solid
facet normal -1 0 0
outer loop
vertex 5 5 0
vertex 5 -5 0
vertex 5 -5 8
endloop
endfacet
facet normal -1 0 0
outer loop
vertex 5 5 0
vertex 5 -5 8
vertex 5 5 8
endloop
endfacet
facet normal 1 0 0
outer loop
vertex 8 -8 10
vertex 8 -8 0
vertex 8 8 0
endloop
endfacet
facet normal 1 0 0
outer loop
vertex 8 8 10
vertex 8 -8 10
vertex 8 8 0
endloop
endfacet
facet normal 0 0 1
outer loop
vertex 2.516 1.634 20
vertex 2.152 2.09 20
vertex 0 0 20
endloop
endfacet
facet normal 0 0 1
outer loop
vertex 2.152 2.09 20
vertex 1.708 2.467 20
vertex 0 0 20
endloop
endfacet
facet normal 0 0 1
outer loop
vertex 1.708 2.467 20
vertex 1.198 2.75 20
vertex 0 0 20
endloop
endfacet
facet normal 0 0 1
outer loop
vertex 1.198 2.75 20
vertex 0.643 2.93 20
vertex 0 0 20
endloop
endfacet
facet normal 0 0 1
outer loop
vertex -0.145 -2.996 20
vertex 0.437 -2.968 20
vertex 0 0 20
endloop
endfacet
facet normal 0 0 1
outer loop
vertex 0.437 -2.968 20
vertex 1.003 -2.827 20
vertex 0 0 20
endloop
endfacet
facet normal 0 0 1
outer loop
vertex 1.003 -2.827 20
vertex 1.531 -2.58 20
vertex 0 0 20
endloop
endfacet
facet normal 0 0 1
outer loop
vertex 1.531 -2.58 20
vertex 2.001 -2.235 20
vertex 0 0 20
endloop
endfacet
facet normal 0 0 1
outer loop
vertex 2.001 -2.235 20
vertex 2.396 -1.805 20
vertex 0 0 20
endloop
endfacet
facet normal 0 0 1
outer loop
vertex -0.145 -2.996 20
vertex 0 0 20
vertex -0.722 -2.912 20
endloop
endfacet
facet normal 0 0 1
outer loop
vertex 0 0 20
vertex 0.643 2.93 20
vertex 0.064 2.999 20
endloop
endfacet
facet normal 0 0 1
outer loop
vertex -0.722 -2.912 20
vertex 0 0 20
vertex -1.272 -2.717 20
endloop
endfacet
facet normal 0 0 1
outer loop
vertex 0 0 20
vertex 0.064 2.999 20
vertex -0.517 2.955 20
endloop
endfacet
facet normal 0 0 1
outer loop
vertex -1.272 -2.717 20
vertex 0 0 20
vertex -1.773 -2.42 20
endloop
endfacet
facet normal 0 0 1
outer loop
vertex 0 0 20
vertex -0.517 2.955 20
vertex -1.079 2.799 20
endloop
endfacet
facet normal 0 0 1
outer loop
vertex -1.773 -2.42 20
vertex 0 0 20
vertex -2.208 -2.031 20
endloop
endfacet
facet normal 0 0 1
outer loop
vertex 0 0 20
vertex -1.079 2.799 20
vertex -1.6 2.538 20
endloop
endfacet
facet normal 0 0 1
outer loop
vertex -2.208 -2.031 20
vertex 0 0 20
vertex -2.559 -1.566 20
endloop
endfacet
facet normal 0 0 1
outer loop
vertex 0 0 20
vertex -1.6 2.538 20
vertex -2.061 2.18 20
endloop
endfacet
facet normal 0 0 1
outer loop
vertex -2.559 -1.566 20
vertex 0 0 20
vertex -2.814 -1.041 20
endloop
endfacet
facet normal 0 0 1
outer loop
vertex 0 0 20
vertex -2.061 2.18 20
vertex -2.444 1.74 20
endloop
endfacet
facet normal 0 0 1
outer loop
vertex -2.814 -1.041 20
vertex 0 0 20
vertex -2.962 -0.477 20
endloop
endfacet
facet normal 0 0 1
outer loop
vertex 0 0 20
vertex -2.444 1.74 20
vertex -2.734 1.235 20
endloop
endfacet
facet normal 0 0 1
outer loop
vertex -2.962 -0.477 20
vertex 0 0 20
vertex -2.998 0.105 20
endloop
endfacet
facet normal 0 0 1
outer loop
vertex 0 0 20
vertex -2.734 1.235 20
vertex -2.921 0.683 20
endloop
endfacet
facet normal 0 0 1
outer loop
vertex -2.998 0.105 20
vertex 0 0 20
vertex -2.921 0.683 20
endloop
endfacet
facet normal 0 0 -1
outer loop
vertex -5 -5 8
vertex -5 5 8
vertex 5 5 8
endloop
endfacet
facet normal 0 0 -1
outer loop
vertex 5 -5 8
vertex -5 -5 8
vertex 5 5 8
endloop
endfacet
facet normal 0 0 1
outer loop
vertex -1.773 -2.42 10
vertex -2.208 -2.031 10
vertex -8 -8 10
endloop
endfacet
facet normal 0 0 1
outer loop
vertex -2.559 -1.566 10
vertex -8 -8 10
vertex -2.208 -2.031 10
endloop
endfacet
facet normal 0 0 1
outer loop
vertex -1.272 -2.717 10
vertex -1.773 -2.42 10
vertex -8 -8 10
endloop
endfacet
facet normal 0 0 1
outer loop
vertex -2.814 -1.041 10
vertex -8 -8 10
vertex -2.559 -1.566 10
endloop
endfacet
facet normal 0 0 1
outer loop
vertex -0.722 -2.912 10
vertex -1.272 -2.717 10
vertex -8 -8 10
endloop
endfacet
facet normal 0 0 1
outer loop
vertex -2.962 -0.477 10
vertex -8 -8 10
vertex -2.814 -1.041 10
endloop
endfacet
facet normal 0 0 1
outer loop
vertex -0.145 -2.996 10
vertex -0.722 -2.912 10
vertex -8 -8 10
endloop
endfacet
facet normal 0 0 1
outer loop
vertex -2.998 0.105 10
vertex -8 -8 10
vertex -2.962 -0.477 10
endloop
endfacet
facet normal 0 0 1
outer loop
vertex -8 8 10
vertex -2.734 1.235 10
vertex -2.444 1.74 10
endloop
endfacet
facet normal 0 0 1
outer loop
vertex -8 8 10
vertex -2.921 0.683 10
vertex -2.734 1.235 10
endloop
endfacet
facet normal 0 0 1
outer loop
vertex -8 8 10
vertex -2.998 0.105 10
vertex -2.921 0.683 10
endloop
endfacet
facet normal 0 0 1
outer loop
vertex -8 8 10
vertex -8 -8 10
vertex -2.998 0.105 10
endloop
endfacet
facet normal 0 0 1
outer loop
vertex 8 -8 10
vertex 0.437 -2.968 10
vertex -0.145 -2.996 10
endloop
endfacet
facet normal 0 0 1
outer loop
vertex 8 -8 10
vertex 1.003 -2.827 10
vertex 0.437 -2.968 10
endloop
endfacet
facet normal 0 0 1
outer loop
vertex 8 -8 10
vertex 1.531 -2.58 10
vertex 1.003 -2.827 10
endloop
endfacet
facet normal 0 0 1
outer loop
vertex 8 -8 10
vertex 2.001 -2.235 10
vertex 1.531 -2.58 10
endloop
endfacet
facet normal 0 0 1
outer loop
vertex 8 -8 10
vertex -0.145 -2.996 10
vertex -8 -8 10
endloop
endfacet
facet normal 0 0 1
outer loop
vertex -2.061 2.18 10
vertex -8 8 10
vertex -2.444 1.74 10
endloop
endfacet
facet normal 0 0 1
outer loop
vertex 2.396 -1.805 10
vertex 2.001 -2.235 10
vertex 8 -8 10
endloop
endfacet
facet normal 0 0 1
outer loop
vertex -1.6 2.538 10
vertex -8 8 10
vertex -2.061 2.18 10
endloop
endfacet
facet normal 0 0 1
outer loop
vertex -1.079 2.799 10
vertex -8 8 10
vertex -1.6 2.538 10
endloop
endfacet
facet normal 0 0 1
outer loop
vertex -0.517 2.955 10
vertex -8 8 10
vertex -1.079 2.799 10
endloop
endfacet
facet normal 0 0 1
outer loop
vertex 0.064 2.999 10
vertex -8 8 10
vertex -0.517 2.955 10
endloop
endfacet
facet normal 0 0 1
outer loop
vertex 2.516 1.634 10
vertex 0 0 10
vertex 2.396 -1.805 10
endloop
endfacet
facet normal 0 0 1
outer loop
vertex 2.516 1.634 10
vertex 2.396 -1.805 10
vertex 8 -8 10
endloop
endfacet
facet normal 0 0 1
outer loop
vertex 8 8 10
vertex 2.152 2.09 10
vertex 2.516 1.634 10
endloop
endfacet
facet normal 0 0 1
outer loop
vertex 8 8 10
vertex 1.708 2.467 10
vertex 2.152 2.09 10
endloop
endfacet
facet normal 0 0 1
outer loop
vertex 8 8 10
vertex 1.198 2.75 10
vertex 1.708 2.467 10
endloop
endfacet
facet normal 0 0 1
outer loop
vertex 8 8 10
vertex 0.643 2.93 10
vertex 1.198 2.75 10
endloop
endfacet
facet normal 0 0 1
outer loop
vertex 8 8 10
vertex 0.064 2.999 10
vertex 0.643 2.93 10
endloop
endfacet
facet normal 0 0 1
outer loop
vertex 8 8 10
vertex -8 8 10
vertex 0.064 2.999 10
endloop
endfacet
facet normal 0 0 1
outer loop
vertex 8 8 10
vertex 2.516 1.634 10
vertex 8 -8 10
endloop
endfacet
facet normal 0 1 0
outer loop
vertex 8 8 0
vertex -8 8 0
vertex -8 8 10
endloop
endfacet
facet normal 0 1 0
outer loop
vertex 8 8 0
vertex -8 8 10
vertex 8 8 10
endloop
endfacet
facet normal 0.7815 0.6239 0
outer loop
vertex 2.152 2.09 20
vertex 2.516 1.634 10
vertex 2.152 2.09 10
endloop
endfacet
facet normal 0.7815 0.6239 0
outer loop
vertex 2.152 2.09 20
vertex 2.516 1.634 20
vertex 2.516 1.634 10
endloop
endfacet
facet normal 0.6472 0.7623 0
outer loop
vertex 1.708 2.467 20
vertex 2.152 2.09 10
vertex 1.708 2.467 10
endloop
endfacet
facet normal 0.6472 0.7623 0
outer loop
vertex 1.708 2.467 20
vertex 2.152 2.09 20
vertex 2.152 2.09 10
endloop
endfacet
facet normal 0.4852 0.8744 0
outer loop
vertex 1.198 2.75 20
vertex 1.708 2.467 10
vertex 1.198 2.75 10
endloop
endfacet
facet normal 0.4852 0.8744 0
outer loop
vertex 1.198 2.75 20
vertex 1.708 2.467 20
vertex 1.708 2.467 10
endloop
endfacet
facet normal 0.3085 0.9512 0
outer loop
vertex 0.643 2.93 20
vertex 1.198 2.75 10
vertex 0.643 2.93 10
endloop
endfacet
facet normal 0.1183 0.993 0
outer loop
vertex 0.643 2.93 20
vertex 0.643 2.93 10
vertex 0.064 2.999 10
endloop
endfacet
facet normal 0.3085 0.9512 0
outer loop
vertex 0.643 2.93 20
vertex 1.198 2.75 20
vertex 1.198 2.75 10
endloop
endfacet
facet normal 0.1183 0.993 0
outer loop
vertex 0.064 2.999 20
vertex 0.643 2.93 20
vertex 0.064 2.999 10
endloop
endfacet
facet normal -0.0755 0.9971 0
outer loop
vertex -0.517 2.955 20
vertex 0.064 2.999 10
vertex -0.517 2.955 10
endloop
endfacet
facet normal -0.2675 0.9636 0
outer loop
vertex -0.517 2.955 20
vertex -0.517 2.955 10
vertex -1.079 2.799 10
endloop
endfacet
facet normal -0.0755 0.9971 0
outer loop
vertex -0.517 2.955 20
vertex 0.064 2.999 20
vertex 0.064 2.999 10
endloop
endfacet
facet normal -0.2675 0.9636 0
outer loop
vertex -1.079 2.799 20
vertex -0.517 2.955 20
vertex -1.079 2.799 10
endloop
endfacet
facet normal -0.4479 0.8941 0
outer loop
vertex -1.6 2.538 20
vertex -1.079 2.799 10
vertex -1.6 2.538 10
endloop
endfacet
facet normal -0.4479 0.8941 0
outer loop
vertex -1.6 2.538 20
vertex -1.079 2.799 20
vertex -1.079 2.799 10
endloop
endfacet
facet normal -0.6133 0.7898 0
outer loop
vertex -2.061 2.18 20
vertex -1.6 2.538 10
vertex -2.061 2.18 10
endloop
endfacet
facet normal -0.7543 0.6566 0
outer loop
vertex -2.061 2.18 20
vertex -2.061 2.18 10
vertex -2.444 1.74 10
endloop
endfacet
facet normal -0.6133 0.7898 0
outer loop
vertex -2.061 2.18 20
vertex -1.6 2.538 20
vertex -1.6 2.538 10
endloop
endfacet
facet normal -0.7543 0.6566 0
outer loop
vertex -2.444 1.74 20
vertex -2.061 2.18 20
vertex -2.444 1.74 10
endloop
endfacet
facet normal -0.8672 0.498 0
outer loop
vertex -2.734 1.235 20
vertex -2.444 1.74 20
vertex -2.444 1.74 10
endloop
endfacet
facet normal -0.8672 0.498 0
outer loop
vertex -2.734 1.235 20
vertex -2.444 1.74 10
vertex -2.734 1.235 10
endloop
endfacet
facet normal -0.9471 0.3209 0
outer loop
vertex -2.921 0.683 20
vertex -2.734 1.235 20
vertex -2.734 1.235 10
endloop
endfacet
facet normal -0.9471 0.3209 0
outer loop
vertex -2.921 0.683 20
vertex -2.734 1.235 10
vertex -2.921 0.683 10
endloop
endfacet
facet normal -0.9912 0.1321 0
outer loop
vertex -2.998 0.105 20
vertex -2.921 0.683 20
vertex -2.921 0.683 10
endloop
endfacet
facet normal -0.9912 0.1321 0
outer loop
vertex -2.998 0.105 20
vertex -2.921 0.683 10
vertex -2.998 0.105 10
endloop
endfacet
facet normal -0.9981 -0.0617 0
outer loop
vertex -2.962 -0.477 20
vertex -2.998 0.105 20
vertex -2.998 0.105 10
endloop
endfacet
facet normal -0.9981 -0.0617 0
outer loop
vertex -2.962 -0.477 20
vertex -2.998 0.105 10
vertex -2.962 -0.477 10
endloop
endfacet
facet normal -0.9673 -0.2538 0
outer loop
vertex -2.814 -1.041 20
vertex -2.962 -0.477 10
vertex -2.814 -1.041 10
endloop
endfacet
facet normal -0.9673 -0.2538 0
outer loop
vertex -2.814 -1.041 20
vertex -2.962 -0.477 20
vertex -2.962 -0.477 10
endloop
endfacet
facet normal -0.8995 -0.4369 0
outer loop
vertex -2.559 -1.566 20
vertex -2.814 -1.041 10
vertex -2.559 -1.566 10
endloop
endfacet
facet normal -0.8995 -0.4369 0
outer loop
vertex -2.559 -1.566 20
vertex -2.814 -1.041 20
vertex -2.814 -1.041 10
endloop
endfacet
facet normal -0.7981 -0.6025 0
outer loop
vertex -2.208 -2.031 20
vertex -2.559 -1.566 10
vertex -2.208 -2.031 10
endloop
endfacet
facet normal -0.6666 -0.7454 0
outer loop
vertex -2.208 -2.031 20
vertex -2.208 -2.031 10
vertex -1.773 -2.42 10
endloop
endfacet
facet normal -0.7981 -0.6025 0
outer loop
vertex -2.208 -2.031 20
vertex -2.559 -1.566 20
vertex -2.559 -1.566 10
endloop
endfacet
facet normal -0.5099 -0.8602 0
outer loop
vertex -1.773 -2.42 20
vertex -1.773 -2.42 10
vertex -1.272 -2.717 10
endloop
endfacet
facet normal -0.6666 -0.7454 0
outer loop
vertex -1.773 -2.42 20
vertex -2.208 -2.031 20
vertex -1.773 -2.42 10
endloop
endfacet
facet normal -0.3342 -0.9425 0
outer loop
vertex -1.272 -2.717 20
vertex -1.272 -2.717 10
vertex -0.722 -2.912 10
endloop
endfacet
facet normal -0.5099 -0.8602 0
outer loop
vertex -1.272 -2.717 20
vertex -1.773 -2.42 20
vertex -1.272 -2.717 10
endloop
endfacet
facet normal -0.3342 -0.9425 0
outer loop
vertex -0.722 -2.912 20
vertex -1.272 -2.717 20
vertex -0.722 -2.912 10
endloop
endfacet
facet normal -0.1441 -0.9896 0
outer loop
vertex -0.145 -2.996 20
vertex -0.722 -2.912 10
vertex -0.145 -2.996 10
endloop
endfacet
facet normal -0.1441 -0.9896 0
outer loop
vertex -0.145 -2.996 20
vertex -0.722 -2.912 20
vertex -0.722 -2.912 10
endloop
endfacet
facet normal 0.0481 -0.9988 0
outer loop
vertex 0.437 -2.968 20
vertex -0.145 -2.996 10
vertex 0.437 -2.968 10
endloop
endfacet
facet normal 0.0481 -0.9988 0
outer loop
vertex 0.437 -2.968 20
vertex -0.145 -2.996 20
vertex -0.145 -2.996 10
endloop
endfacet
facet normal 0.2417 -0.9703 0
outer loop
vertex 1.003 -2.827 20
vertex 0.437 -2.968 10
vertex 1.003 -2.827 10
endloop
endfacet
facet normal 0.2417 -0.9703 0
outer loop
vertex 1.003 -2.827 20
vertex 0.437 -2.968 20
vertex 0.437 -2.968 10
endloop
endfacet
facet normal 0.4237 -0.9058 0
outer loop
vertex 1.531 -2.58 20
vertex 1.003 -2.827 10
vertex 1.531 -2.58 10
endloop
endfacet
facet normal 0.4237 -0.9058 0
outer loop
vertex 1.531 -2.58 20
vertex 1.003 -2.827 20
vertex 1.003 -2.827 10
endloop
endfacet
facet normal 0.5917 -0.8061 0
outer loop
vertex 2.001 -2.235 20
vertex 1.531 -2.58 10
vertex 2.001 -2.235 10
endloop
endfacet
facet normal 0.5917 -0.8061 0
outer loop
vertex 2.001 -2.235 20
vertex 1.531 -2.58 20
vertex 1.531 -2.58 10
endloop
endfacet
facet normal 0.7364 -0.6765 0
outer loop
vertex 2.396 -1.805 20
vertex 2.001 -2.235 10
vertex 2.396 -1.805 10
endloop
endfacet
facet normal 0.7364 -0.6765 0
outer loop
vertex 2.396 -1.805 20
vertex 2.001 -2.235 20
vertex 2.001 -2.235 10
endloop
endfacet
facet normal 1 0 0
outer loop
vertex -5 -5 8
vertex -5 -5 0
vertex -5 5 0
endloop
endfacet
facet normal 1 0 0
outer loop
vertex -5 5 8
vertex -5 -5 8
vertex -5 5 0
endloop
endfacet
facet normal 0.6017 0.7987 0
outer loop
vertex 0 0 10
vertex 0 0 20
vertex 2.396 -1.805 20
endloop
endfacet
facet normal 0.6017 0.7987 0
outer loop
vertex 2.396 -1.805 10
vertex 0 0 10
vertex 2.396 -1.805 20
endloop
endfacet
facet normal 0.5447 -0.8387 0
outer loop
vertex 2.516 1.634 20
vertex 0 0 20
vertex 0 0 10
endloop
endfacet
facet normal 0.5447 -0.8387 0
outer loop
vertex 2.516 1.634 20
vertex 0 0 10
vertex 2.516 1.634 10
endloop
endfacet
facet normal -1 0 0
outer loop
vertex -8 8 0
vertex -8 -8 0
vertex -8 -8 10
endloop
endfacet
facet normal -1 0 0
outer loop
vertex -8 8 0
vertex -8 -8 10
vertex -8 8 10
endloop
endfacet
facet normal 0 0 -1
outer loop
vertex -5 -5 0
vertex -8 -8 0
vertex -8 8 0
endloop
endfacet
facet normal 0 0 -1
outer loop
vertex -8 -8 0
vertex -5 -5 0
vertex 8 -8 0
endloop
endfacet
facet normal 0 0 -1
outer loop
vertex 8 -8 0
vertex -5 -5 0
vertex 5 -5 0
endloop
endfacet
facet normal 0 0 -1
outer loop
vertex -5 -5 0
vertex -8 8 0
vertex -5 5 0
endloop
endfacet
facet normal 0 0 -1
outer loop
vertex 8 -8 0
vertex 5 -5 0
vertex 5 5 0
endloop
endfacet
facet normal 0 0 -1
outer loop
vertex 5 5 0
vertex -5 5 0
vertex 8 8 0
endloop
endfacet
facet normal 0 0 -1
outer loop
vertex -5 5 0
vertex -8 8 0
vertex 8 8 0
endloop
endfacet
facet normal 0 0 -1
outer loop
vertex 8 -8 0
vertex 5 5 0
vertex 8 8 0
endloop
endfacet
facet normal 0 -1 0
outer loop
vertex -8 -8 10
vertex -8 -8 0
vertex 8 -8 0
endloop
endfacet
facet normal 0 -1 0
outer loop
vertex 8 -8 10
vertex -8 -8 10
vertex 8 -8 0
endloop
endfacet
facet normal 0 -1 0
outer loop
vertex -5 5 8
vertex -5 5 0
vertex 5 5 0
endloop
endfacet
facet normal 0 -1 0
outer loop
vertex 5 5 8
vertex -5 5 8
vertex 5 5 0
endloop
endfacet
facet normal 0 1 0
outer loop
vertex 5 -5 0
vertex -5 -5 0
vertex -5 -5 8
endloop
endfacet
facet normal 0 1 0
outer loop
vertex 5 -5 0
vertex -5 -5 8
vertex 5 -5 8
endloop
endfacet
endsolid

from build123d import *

# Parameters (mm, degrees)
BOX001_W                 = 10
BOX001_H                 = 10
BOX001_DEPTH             = 8
CYLINDER_W               = 3
CYLINDER_H               = 10
CYLINDER_ANGLE           = 290
CYLINDER_PLACEMENT_ANGLE = 33
BOX_W                    = 16
BOX_H                    = 16
BOX_DEPTH                = 10


with BuildPart() as cube001:
    # Box001 → Box001 (new body)
    with BuildSketch(Plane(origin=(-5, -5, 0), x_dir=(1, 0, 0), z_dir=(0, 0, 1))):
        with Locations((5, 5)):
            Rectangle(BOX001_W, BOX001_H)
    extrude(amount=BOX001_DEPTH)


with BuildPart() as cylinder:
    # Cylinder → Cylinder (revolve)
    with BuildSketch(Plane.XZ):
        with Locations((1.5, 5)):
            Rectangle(CYLINDER_W, CYLINDER_H)
    revolve(axis=Axis((0, 0, 0), (0, 0, 1)), revolution_arc=CYLINDER_ANGLE)


with BuildPart() as cylinder_1:
    # Cylinder placement: moved
    add(cylinder.part.moved(Location((0, 0, 10))).rotate(Axis((0, 0, 10), (0, 0, 1)), CYLINDER_PLACEMENT_ANGLE))


with BuildPart() as cut:
    # Box → Box (new body)
    with BuildSketch(Plane(origin=(-8, -8, 0), x_dir=(1, 0, 0), z_dir=(0, 0, 1))):
        with Locations((8, 8)):
            Rectangle(BOX_W, BOX_H)
    extrude(amount=BOX_DEPTH)

    # Fusion: union Cylinder
    add(cylinder_1.part)

    # Cut: cut Cube001
    add(cube001.part, mode=Mode.SUBTRACT)


solid = cut.part
